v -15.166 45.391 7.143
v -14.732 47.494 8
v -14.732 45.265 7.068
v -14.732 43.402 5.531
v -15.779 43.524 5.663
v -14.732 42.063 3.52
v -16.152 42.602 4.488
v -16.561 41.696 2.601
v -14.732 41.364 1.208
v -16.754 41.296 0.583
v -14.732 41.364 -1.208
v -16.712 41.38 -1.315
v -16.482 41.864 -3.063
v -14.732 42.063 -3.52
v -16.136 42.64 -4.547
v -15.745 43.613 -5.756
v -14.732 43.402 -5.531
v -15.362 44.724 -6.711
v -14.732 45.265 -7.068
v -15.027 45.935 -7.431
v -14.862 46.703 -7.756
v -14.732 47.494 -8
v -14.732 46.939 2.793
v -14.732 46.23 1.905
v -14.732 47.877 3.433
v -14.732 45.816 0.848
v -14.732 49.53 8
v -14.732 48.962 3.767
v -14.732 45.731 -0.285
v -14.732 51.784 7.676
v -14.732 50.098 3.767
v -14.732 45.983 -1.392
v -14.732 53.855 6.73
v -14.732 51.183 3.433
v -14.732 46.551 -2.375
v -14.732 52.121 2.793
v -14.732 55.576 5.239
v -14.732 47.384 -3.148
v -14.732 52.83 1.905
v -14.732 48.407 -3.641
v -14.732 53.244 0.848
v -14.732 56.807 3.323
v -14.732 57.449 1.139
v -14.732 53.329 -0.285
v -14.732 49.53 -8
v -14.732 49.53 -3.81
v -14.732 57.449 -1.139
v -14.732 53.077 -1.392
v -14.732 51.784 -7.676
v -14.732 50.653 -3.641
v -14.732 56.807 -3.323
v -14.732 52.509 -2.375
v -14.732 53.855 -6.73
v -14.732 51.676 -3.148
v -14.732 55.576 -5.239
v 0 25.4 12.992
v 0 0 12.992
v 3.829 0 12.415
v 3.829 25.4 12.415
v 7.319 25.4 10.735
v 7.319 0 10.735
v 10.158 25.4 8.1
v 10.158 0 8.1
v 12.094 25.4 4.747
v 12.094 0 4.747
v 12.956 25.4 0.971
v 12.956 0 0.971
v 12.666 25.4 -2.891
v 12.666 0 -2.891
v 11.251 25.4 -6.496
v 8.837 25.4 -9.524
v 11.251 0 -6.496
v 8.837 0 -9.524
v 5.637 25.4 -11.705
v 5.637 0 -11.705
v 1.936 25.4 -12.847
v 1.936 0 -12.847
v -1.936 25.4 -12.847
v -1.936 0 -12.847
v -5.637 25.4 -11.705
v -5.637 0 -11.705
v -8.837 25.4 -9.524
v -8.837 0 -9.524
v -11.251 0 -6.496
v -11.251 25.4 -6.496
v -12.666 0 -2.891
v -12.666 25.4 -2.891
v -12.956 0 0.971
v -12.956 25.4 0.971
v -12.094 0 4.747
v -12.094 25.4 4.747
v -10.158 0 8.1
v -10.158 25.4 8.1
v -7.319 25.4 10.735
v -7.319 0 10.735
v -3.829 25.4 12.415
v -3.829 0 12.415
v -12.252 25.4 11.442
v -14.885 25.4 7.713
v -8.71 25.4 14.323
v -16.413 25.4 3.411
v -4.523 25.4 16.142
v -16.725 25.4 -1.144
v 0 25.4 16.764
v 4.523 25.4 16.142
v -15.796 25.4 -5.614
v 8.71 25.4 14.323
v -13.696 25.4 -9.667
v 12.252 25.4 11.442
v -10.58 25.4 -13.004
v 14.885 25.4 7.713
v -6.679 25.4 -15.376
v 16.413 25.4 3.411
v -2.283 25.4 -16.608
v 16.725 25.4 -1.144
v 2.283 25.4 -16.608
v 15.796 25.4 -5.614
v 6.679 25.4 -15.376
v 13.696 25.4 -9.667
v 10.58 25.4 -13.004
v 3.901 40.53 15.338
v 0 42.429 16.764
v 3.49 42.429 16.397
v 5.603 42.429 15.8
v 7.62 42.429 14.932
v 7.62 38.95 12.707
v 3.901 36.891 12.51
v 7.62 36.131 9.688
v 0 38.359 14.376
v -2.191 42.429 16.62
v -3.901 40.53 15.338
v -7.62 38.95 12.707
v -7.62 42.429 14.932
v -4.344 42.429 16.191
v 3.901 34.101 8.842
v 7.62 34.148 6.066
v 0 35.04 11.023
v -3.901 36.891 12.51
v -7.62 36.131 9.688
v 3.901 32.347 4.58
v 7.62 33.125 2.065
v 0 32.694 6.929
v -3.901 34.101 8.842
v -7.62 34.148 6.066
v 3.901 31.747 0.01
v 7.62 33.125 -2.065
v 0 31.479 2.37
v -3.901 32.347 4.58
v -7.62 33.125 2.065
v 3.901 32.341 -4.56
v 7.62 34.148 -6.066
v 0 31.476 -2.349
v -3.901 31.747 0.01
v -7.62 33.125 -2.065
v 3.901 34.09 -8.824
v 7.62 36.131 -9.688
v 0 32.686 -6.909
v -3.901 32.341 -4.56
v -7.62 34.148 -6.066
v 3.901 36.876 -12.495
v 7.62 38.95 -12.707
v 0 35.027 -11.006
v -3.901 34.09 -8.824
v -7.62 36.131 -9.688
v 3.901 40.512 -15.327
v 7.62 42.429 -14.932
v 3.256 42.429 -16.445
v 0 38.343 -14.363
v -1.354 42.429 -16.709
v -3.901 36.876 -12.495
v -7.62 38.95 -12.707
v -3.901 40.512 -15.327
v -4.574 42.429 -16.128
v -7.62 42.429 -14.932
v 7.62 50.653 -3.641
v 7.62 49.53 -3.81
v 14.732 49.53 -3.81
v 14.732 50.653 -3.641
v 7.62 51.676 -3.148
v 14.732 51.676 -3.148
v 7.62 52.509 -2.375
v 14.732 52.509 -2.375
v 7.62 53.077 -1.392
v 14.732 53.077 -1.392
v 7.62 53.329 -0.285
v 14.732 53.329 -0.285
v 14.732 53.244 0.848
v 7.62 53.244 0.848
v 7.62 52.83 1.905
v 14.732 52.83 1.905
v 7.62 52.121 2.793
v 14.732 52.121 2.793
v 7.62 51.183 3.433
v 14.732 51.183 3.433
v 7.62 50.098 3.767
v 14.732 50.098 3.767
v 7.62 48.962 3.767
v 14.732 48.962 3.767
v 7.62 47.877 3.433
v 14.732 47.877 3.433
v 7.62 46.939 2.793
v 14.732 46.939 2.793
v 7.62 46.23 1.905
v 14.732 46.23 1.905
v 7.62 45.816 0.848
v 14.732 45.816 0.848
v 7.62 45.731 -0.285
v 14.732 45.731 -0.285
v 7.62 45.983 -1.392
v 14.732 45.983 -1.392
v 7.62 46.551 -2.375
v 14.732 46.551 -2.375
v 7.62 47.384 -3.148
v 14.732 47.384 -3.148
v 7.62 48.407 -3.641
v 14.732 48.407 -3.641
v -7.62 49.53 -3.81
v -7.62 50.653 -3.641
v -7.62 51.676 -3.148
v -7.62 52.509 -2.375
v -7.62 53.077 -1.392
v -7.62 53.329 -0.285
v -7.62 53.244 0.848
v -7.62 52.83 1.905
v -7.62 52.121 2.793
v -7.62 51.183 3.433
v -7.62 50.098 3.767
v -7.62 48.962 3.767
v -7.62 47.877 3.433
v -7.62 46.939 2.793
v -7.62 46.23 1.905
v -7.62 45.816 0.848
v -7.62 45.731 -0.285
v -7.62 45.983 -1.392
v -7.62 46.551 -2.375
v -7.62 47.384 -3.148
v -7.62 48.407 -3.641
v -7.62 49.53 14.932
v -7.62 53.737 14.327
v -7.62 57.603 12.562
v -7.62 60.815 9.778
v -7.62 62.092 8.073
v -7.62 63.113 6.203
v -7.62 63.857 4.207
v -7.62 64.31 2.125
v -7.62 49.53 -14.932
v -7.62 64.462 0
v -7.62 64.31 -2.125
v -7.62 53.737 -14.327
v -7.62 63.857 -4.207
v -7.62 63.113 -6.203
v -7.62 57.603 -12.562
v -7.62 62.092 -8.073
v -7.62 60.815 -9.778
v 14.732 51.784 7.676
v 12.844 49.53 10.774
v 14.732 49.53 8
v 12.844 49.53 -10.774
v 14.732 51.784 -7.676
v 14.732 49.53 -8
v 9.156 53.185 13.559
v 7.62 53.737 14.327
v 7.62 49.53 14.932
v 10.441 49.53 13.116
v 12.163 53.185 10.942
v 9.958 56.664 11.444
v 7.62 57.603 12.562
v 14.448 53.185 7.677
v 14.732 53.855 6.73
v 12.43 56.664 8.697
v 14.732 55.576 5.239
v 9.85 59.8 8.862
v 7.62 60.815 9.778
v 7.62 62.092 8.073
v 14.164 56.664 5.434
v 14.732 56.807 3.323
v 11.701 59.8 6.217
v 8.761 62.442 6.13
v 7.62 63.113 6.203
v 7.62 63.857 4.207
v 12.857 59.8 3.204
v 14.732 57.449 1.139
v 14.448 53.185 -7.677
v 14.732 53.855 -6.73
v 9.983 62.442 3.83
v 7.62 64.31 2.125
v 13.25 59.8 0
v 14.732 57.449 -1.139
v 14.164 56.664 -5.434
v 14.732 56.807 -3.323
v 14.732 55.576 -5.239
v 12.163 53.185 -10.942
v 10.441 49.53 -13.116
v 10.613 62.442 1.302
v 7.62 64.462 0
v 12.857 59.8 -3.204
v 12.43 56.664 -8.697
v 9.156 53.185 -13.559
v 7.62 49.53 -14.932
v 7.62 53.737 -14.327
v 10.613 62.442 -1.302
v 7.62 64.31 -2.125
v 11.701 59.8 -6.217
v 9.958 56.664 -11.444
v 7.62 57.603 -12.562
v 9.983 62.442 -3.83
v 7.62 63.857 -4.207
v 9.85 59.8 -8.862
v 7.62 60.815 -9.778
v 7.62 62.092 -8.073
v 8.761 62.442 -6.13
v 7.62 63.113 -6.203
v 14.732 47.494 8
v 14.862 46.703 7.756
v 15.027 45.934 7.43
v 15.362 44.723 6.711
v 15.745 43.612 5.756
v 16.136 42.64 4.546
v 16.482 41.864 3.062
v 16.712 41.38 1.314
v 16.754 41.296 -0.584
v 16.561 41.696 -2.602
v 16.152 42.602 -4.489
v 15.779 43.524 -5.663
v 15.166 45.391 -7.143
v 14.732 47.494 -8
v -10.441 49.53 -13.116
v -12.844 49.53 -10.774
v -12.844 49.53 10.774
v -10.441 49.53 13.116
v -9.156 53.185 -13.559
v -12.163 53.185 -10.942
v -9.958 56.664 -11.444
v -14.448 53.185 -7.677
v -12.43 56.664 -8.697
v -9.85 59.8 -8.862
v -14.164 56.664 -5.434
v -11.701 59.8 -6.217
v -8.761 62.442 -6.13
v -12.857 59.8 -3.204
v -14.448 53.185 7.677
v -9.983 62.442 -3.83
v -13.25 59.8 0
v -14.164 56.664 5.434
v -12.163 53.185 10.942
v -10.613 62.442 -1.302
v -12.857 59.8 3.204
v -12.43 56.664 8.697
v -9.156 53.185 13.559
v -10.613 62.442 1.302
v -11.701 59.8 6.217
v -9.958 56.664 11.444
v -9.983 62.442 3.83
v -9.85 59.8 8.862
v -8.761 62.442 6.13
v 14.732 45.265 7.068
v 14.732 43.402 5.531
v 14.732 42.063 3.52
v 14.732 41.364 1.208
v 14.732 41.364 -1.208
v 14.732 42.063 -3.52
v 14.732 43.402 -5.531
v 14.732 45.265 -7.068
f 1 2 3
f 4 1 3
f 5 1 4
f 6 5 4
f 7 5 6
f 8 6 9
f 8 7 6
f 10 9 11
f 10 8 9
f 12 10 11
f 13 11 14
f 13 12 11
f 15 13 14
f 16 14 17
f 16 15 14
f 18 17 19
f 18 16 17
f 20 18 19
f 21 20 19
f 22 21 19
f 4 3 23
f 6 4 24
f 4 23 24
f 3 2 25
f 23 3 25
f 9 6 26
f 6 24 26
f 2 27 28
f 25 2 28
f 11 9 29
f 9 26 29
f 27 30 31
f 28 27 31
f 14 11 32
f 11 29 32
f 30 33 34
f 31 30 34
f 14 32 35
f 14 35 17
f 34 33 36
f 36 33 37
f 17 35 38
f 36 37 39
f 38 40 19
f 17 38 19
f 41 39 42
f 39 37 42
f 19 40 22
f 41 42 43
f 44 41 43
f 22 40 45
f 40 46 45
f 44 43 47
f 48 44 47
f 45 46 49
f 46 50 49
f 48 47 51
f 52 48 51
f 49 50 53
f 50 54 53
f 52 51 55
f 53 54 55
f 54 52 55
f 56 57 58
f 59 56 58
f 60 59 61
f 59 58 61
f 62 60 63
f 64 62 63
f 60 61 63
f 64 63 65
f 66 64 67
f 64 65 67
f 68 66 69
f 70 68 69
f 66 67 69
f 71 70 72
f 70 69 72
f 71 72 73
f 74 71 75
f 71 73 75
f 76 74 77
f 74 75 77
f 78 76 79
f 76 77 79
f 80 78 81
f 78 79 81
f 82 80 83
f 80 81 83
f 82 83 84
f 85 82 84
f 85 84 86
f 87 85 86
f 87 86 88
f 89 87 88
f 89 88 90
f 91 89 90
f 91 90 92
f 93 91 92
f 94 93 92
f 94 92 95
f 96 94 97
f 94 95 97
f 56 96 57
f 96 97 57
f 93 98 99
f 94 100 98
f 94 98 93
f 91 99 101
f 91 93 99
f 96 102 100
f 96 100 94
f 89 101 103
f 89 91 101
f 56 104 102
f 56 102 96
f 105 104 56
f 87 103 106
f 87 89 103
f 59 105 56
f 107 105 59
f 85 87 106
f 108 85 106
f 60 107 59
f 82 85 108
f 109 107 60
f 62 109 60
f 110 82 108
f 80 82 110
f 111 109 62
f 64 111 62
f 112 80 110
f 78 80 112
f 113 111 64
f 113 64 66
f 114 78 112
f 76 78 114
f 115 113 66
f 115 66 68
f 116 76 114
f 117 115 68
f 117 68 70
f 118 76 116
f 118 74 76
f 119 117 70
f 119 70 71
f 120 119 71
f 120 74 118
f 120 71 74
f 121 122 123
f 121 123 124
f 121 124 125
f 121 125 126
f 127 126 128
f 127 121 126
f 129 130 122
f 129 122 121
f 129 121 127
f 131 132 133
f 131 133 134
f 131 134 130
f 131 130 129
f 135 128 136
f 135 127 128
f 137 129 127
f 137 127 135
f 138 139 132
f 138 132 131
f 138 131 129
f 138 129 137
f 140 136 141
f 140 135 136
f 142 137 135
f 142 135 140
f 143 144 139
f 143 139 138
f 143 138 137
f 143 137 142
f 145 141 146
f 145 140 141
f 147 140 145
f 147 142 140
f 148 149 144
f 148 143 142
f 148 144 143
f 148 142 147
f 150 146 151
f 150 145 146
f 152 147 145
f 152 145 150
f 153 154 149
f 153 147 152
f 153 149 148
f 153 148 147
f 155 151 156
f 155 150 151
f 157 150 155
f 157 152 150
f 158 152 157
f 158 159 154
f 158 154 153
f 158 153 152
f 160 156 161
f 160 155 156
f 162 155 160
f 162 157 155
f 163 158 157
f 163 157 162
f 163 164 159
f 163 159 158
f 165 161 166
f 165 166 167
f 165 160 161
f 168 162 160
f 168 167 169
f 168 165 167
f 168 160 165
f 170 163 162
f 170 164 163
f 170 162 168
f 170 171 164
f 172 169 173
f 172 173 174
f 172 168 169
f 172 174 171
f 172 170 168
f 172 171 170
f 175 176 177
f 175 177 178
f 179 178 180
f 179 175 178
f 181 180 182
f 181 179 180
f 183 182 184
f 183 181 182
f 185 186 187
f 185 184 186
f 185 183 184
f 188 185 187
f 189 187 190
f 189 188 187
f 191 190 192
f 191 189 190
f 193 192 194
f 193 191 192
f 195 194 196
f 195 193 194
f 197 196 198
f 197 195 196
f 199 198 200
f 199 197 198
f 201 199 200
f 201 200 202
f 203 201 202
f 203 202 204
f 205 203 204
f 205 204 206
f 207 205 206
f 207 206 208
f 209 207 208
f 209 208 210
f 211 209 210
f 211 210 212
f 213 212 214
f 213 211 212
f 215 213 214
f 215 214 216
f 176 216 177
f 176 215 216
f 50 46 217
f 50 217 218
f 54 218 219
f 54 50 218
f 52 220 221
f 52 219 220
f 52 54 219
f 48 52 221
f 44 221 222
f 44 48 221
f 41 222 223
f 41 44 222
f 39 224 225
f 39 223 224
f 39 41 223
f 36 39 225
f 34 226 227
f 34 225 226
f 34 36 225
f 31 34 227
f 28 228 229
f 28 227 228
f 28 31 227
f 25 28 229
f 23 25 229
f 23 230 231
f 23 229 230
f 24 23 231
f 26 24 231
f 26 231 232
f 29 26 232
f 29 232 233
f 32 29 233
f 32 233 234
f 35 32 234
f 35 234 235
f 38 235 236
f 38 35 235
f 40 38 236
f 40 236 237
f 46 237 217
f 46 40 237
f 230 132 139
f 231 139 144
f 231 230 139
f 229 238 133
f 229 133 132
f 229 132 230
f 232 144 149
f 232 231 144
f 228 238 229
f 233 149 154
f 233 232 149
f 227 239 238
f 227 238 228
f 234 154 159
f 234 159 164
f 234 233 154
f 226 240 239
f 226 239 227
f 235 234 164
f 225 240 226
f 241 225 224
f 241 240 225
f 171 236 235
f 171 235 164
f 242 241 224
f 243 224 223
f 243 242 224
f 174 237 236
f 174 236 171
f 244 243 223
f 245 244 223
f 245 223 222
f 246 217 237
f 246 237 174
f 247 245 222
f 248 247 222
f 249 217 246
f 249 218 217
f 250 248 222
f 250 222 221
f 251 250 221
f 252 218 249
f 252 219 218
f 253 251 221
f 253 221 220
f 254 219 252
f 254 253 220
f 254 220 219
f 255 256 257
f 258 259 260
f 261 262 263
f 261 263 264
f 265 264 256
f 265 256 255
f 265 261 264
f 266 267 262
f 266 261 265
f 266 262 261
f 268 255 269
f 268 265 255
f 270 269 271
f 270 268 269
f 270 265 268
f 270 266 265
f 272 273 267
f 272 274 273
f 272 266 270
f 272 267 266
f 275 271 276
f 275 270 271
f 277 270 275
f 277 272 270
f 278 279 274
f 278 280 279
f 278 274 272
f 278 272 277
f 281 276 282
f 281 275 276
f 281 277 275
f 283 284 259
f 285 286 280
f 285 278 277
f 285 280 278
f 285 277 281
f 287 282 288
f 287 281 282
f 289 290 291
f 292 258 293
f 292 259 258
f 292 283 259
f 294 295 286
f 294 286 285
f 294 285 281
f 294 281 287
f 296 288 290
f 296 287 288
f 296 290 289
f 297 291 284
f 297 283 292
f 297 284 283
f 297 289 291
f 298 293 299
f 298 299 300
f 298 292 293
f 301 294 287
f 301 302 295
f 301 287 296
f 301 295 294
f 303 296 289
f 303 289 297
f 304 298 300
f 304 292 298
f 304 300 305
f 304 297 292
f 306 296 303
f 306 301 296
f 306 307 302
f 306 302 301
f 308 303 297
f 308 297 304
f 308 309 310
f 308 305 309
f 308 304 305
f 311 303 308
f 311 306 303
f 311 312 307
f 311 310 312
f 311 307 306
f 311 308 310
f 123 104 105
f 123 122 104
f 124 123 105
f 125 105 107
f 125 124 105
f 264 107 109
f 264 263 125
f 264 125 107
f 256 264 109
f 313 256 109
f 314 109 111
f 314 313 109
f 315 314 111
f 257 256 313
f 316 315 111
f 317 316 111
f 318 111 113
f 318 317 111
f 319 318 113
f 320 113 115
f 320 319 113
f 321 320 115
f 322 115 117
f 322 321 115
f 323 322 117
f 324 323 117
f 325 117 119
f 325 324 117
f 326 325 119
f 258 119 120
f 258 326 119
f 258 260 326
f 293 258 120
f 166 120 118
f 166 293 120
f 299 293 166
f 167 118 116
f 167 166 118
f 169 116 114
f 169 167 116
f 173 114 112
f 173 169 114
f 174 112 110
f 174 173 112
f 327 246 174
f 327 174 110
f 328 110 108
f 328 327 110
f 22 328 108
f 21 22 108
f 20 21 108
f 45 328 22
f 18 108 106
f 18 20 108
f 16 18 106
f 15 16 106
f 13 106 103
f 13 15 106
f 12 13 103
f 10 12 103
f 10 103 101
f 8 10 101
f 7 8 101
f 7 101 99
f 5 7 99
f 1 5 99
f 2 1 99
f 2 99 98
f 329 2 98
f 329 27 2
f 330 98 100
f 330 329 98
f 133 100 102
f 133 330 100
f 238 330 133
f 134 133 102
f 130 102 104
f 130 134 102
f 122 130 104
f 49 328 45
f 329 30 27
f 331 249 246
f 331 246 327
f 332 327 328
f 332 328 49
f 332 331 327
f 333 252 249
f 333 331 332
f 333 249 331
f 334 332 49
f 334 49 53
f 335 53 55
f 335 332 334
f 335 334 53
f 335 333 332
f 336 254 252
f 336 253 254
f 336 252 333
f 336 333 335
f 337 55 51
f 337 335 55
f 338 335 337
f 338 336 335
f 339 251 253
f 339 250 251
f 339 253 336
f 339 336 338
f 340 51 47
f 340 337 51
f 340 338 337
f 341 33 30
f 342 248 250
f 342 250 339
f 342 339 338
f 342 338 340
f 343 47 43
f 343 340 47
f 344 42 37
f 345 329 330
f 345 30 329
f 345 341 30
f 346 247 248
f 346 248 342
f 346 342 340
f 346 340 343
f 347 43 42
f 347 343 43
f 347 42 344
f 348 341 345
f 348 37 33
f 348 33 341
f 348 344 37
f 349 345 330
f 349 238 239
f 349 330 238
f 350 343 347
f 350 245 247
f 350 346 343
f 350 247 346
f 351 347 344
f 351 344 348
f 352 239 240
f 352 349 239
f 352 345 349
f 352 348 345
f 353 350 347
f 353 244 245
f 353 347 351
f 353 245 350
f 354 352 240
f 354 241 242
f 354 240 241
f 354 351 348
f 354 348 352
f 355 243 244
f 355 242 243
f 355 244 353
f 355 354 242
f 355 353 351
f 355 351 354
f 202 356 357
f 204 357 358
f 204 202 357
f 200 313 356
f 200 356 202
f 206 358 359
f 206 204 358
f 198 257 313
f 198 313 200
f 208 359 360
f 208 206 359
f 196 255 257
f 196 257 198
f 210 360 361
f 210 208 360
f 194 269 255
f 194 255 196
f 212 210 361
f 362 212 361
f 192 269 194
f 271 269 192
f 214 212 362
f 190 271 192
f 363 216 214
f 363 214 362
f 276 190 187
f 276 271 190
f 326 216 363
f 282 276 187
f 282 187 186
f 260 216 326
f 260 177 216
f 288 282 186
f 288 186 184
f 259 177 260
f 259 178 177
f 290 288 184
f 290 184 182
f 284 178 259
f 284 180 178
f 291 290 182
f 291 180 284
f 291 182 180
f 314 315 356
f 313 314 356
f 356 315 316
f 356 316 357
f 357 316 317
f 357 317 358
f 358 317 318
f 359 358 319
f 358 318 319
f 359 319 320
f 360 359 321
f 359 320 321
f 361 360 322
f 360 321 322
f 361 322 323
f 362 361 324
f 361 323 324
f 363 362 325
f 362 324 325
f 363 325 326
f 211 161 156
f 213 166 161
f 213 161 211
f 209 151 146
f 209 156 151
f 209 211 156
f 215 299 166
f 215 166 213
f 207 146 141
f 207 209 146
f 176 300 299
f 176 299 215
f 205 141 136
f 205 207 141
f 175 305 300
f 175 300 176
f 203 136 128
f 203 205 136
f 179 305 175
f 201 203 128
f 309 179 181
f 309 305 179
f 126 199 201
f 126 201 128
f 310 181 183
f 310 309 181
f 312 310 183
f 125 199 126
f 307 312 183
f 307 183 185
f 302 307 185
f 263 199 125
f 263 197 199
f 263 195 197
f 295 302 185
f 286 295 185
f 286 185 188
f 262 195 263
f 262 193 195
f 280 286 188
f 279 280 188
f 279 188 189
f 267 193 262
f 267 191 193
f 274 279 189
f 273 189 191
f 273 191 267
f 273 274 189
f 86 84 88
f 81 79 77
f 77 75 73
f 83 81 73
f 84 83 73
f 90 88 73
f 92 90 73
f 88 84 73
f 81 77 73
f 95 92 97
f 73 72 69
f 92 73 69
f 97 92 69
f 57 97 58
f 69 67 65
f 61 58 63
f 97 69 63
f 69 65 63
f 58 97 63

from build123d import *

# Parameters (mm, degrees)
SKETCH1_R               = 12.9921
BOSS_EXTRUDE1_DEPTH     = 25.4
CUT_EXTRUDE1_DEPTH      = 71.405666164
CUT_EXTRUDE1_DEPTH_BACK = 71.405666164
SKETCH3_R               = 3.81
SKETCH6_R               = 8.255
CUT_EXTRUDE2_DEPTH      = 2.032


with BuildPart() as part:
    # Sketch1 → Boss-Extrude1 (new body)
    with BuildSketch(Plane(origin=(0, 0, 0), x_dir=(1, 0, 0), z_dir=(0, 1, 0))):
        with Locations(Location((0, 0, 0), (0, 0, 270))):
            Circle(SKETCH1_R)
    extrude(amount=BOSS_EXTRUDE1_DEPTH)

    # Sketch2 → Revolve1 (revolve)
    with BuildSketch(Plane(origin=(0, 0, 0), x_dir=(0, 0, -1), z_dir=(1, 0, 0))):
        with BuildLine():
            Line((-16.764, 25.4), (-16.764, 49.53))
            ThreePointArc((-16.764, 49.53), (-11.85393808, 61.38393808), (0, 66.294))
            Line((0, 66.294), (0, 25.4))
            Line((0, 25.4), (-16.764, 25.4))
        make_face()
    revolve(axis=Axis((0, 25.4, 0), (0, 1, 0)))

    # Sketch3 → Cut-Extrude1 (cut, two sides: drawn at the far end of the back side and taken through both)
    with BuildSketch(Plane(origin=(0, 0, 0), x_dir=(0, 0, -1), z_dir=(1, 0, 0)).offset(-CUT_EXTRUDE1_DEPTH_BACK)):
        with Locations((0, 49.53)):
            Circle(SKETCH3_R)
    extrude(amount=CUT_EXTRUDE1_DEPTH + CUT_EXTRUDE1_DEPTH_BACK, mode=Mode.SUBTRACT)

    # Sketch4 → Cut-Revolve1 (revolve, cut)
    with BuildSketch(Plane.XY, mode=Mode.PRIVATE) as cut_revolve1_sk:
        with BuildLine():
            Line((-7.62, 32.995439638), (-7.62, 49.53))
            Line((-7.62, 49.53), (7.62, 49.53))
            Line((7.62, 49.53), (7.62, 32.995439638))
            ThreePointArc((7.62, 32.995439638), (0, 31.32406453), (-7.62, 32.995439638))
        make_face()
    revolve(cut_revolve1_sk.sketch.rotate(Axis((-7.62, 49.53, 0), (1, 0, 0)), 90), axis=Axis((-7.62, 49.53, 0), (1, 0, 0)), mode=Mode.SUBTRACT)

    # Sketch6 → Cut-Extrude2 (cut)
    with BuildSketch(Plane(origin=(16.764, 0, 0), x_dir=(0, 0, -1), z_dir=(1, 0, 0))):
        with Locations((0, 49.53)):
            Circle(SKETCH6_R)
    cut_extrude2 = extrude(amount=-CUT_EXTRUDE2_DEPTH, mode=Mode.SUBTRACT)

    # Mirror1: Cut-Extrude2 across plane
    add(cut_extrude2.mirror(Plane(origin=(0, 0, 0), x_dir=(0, 0, 1), z_dir=(1, 0, 0))), mode=Mode.SUBTRACT)


solid = part.part
